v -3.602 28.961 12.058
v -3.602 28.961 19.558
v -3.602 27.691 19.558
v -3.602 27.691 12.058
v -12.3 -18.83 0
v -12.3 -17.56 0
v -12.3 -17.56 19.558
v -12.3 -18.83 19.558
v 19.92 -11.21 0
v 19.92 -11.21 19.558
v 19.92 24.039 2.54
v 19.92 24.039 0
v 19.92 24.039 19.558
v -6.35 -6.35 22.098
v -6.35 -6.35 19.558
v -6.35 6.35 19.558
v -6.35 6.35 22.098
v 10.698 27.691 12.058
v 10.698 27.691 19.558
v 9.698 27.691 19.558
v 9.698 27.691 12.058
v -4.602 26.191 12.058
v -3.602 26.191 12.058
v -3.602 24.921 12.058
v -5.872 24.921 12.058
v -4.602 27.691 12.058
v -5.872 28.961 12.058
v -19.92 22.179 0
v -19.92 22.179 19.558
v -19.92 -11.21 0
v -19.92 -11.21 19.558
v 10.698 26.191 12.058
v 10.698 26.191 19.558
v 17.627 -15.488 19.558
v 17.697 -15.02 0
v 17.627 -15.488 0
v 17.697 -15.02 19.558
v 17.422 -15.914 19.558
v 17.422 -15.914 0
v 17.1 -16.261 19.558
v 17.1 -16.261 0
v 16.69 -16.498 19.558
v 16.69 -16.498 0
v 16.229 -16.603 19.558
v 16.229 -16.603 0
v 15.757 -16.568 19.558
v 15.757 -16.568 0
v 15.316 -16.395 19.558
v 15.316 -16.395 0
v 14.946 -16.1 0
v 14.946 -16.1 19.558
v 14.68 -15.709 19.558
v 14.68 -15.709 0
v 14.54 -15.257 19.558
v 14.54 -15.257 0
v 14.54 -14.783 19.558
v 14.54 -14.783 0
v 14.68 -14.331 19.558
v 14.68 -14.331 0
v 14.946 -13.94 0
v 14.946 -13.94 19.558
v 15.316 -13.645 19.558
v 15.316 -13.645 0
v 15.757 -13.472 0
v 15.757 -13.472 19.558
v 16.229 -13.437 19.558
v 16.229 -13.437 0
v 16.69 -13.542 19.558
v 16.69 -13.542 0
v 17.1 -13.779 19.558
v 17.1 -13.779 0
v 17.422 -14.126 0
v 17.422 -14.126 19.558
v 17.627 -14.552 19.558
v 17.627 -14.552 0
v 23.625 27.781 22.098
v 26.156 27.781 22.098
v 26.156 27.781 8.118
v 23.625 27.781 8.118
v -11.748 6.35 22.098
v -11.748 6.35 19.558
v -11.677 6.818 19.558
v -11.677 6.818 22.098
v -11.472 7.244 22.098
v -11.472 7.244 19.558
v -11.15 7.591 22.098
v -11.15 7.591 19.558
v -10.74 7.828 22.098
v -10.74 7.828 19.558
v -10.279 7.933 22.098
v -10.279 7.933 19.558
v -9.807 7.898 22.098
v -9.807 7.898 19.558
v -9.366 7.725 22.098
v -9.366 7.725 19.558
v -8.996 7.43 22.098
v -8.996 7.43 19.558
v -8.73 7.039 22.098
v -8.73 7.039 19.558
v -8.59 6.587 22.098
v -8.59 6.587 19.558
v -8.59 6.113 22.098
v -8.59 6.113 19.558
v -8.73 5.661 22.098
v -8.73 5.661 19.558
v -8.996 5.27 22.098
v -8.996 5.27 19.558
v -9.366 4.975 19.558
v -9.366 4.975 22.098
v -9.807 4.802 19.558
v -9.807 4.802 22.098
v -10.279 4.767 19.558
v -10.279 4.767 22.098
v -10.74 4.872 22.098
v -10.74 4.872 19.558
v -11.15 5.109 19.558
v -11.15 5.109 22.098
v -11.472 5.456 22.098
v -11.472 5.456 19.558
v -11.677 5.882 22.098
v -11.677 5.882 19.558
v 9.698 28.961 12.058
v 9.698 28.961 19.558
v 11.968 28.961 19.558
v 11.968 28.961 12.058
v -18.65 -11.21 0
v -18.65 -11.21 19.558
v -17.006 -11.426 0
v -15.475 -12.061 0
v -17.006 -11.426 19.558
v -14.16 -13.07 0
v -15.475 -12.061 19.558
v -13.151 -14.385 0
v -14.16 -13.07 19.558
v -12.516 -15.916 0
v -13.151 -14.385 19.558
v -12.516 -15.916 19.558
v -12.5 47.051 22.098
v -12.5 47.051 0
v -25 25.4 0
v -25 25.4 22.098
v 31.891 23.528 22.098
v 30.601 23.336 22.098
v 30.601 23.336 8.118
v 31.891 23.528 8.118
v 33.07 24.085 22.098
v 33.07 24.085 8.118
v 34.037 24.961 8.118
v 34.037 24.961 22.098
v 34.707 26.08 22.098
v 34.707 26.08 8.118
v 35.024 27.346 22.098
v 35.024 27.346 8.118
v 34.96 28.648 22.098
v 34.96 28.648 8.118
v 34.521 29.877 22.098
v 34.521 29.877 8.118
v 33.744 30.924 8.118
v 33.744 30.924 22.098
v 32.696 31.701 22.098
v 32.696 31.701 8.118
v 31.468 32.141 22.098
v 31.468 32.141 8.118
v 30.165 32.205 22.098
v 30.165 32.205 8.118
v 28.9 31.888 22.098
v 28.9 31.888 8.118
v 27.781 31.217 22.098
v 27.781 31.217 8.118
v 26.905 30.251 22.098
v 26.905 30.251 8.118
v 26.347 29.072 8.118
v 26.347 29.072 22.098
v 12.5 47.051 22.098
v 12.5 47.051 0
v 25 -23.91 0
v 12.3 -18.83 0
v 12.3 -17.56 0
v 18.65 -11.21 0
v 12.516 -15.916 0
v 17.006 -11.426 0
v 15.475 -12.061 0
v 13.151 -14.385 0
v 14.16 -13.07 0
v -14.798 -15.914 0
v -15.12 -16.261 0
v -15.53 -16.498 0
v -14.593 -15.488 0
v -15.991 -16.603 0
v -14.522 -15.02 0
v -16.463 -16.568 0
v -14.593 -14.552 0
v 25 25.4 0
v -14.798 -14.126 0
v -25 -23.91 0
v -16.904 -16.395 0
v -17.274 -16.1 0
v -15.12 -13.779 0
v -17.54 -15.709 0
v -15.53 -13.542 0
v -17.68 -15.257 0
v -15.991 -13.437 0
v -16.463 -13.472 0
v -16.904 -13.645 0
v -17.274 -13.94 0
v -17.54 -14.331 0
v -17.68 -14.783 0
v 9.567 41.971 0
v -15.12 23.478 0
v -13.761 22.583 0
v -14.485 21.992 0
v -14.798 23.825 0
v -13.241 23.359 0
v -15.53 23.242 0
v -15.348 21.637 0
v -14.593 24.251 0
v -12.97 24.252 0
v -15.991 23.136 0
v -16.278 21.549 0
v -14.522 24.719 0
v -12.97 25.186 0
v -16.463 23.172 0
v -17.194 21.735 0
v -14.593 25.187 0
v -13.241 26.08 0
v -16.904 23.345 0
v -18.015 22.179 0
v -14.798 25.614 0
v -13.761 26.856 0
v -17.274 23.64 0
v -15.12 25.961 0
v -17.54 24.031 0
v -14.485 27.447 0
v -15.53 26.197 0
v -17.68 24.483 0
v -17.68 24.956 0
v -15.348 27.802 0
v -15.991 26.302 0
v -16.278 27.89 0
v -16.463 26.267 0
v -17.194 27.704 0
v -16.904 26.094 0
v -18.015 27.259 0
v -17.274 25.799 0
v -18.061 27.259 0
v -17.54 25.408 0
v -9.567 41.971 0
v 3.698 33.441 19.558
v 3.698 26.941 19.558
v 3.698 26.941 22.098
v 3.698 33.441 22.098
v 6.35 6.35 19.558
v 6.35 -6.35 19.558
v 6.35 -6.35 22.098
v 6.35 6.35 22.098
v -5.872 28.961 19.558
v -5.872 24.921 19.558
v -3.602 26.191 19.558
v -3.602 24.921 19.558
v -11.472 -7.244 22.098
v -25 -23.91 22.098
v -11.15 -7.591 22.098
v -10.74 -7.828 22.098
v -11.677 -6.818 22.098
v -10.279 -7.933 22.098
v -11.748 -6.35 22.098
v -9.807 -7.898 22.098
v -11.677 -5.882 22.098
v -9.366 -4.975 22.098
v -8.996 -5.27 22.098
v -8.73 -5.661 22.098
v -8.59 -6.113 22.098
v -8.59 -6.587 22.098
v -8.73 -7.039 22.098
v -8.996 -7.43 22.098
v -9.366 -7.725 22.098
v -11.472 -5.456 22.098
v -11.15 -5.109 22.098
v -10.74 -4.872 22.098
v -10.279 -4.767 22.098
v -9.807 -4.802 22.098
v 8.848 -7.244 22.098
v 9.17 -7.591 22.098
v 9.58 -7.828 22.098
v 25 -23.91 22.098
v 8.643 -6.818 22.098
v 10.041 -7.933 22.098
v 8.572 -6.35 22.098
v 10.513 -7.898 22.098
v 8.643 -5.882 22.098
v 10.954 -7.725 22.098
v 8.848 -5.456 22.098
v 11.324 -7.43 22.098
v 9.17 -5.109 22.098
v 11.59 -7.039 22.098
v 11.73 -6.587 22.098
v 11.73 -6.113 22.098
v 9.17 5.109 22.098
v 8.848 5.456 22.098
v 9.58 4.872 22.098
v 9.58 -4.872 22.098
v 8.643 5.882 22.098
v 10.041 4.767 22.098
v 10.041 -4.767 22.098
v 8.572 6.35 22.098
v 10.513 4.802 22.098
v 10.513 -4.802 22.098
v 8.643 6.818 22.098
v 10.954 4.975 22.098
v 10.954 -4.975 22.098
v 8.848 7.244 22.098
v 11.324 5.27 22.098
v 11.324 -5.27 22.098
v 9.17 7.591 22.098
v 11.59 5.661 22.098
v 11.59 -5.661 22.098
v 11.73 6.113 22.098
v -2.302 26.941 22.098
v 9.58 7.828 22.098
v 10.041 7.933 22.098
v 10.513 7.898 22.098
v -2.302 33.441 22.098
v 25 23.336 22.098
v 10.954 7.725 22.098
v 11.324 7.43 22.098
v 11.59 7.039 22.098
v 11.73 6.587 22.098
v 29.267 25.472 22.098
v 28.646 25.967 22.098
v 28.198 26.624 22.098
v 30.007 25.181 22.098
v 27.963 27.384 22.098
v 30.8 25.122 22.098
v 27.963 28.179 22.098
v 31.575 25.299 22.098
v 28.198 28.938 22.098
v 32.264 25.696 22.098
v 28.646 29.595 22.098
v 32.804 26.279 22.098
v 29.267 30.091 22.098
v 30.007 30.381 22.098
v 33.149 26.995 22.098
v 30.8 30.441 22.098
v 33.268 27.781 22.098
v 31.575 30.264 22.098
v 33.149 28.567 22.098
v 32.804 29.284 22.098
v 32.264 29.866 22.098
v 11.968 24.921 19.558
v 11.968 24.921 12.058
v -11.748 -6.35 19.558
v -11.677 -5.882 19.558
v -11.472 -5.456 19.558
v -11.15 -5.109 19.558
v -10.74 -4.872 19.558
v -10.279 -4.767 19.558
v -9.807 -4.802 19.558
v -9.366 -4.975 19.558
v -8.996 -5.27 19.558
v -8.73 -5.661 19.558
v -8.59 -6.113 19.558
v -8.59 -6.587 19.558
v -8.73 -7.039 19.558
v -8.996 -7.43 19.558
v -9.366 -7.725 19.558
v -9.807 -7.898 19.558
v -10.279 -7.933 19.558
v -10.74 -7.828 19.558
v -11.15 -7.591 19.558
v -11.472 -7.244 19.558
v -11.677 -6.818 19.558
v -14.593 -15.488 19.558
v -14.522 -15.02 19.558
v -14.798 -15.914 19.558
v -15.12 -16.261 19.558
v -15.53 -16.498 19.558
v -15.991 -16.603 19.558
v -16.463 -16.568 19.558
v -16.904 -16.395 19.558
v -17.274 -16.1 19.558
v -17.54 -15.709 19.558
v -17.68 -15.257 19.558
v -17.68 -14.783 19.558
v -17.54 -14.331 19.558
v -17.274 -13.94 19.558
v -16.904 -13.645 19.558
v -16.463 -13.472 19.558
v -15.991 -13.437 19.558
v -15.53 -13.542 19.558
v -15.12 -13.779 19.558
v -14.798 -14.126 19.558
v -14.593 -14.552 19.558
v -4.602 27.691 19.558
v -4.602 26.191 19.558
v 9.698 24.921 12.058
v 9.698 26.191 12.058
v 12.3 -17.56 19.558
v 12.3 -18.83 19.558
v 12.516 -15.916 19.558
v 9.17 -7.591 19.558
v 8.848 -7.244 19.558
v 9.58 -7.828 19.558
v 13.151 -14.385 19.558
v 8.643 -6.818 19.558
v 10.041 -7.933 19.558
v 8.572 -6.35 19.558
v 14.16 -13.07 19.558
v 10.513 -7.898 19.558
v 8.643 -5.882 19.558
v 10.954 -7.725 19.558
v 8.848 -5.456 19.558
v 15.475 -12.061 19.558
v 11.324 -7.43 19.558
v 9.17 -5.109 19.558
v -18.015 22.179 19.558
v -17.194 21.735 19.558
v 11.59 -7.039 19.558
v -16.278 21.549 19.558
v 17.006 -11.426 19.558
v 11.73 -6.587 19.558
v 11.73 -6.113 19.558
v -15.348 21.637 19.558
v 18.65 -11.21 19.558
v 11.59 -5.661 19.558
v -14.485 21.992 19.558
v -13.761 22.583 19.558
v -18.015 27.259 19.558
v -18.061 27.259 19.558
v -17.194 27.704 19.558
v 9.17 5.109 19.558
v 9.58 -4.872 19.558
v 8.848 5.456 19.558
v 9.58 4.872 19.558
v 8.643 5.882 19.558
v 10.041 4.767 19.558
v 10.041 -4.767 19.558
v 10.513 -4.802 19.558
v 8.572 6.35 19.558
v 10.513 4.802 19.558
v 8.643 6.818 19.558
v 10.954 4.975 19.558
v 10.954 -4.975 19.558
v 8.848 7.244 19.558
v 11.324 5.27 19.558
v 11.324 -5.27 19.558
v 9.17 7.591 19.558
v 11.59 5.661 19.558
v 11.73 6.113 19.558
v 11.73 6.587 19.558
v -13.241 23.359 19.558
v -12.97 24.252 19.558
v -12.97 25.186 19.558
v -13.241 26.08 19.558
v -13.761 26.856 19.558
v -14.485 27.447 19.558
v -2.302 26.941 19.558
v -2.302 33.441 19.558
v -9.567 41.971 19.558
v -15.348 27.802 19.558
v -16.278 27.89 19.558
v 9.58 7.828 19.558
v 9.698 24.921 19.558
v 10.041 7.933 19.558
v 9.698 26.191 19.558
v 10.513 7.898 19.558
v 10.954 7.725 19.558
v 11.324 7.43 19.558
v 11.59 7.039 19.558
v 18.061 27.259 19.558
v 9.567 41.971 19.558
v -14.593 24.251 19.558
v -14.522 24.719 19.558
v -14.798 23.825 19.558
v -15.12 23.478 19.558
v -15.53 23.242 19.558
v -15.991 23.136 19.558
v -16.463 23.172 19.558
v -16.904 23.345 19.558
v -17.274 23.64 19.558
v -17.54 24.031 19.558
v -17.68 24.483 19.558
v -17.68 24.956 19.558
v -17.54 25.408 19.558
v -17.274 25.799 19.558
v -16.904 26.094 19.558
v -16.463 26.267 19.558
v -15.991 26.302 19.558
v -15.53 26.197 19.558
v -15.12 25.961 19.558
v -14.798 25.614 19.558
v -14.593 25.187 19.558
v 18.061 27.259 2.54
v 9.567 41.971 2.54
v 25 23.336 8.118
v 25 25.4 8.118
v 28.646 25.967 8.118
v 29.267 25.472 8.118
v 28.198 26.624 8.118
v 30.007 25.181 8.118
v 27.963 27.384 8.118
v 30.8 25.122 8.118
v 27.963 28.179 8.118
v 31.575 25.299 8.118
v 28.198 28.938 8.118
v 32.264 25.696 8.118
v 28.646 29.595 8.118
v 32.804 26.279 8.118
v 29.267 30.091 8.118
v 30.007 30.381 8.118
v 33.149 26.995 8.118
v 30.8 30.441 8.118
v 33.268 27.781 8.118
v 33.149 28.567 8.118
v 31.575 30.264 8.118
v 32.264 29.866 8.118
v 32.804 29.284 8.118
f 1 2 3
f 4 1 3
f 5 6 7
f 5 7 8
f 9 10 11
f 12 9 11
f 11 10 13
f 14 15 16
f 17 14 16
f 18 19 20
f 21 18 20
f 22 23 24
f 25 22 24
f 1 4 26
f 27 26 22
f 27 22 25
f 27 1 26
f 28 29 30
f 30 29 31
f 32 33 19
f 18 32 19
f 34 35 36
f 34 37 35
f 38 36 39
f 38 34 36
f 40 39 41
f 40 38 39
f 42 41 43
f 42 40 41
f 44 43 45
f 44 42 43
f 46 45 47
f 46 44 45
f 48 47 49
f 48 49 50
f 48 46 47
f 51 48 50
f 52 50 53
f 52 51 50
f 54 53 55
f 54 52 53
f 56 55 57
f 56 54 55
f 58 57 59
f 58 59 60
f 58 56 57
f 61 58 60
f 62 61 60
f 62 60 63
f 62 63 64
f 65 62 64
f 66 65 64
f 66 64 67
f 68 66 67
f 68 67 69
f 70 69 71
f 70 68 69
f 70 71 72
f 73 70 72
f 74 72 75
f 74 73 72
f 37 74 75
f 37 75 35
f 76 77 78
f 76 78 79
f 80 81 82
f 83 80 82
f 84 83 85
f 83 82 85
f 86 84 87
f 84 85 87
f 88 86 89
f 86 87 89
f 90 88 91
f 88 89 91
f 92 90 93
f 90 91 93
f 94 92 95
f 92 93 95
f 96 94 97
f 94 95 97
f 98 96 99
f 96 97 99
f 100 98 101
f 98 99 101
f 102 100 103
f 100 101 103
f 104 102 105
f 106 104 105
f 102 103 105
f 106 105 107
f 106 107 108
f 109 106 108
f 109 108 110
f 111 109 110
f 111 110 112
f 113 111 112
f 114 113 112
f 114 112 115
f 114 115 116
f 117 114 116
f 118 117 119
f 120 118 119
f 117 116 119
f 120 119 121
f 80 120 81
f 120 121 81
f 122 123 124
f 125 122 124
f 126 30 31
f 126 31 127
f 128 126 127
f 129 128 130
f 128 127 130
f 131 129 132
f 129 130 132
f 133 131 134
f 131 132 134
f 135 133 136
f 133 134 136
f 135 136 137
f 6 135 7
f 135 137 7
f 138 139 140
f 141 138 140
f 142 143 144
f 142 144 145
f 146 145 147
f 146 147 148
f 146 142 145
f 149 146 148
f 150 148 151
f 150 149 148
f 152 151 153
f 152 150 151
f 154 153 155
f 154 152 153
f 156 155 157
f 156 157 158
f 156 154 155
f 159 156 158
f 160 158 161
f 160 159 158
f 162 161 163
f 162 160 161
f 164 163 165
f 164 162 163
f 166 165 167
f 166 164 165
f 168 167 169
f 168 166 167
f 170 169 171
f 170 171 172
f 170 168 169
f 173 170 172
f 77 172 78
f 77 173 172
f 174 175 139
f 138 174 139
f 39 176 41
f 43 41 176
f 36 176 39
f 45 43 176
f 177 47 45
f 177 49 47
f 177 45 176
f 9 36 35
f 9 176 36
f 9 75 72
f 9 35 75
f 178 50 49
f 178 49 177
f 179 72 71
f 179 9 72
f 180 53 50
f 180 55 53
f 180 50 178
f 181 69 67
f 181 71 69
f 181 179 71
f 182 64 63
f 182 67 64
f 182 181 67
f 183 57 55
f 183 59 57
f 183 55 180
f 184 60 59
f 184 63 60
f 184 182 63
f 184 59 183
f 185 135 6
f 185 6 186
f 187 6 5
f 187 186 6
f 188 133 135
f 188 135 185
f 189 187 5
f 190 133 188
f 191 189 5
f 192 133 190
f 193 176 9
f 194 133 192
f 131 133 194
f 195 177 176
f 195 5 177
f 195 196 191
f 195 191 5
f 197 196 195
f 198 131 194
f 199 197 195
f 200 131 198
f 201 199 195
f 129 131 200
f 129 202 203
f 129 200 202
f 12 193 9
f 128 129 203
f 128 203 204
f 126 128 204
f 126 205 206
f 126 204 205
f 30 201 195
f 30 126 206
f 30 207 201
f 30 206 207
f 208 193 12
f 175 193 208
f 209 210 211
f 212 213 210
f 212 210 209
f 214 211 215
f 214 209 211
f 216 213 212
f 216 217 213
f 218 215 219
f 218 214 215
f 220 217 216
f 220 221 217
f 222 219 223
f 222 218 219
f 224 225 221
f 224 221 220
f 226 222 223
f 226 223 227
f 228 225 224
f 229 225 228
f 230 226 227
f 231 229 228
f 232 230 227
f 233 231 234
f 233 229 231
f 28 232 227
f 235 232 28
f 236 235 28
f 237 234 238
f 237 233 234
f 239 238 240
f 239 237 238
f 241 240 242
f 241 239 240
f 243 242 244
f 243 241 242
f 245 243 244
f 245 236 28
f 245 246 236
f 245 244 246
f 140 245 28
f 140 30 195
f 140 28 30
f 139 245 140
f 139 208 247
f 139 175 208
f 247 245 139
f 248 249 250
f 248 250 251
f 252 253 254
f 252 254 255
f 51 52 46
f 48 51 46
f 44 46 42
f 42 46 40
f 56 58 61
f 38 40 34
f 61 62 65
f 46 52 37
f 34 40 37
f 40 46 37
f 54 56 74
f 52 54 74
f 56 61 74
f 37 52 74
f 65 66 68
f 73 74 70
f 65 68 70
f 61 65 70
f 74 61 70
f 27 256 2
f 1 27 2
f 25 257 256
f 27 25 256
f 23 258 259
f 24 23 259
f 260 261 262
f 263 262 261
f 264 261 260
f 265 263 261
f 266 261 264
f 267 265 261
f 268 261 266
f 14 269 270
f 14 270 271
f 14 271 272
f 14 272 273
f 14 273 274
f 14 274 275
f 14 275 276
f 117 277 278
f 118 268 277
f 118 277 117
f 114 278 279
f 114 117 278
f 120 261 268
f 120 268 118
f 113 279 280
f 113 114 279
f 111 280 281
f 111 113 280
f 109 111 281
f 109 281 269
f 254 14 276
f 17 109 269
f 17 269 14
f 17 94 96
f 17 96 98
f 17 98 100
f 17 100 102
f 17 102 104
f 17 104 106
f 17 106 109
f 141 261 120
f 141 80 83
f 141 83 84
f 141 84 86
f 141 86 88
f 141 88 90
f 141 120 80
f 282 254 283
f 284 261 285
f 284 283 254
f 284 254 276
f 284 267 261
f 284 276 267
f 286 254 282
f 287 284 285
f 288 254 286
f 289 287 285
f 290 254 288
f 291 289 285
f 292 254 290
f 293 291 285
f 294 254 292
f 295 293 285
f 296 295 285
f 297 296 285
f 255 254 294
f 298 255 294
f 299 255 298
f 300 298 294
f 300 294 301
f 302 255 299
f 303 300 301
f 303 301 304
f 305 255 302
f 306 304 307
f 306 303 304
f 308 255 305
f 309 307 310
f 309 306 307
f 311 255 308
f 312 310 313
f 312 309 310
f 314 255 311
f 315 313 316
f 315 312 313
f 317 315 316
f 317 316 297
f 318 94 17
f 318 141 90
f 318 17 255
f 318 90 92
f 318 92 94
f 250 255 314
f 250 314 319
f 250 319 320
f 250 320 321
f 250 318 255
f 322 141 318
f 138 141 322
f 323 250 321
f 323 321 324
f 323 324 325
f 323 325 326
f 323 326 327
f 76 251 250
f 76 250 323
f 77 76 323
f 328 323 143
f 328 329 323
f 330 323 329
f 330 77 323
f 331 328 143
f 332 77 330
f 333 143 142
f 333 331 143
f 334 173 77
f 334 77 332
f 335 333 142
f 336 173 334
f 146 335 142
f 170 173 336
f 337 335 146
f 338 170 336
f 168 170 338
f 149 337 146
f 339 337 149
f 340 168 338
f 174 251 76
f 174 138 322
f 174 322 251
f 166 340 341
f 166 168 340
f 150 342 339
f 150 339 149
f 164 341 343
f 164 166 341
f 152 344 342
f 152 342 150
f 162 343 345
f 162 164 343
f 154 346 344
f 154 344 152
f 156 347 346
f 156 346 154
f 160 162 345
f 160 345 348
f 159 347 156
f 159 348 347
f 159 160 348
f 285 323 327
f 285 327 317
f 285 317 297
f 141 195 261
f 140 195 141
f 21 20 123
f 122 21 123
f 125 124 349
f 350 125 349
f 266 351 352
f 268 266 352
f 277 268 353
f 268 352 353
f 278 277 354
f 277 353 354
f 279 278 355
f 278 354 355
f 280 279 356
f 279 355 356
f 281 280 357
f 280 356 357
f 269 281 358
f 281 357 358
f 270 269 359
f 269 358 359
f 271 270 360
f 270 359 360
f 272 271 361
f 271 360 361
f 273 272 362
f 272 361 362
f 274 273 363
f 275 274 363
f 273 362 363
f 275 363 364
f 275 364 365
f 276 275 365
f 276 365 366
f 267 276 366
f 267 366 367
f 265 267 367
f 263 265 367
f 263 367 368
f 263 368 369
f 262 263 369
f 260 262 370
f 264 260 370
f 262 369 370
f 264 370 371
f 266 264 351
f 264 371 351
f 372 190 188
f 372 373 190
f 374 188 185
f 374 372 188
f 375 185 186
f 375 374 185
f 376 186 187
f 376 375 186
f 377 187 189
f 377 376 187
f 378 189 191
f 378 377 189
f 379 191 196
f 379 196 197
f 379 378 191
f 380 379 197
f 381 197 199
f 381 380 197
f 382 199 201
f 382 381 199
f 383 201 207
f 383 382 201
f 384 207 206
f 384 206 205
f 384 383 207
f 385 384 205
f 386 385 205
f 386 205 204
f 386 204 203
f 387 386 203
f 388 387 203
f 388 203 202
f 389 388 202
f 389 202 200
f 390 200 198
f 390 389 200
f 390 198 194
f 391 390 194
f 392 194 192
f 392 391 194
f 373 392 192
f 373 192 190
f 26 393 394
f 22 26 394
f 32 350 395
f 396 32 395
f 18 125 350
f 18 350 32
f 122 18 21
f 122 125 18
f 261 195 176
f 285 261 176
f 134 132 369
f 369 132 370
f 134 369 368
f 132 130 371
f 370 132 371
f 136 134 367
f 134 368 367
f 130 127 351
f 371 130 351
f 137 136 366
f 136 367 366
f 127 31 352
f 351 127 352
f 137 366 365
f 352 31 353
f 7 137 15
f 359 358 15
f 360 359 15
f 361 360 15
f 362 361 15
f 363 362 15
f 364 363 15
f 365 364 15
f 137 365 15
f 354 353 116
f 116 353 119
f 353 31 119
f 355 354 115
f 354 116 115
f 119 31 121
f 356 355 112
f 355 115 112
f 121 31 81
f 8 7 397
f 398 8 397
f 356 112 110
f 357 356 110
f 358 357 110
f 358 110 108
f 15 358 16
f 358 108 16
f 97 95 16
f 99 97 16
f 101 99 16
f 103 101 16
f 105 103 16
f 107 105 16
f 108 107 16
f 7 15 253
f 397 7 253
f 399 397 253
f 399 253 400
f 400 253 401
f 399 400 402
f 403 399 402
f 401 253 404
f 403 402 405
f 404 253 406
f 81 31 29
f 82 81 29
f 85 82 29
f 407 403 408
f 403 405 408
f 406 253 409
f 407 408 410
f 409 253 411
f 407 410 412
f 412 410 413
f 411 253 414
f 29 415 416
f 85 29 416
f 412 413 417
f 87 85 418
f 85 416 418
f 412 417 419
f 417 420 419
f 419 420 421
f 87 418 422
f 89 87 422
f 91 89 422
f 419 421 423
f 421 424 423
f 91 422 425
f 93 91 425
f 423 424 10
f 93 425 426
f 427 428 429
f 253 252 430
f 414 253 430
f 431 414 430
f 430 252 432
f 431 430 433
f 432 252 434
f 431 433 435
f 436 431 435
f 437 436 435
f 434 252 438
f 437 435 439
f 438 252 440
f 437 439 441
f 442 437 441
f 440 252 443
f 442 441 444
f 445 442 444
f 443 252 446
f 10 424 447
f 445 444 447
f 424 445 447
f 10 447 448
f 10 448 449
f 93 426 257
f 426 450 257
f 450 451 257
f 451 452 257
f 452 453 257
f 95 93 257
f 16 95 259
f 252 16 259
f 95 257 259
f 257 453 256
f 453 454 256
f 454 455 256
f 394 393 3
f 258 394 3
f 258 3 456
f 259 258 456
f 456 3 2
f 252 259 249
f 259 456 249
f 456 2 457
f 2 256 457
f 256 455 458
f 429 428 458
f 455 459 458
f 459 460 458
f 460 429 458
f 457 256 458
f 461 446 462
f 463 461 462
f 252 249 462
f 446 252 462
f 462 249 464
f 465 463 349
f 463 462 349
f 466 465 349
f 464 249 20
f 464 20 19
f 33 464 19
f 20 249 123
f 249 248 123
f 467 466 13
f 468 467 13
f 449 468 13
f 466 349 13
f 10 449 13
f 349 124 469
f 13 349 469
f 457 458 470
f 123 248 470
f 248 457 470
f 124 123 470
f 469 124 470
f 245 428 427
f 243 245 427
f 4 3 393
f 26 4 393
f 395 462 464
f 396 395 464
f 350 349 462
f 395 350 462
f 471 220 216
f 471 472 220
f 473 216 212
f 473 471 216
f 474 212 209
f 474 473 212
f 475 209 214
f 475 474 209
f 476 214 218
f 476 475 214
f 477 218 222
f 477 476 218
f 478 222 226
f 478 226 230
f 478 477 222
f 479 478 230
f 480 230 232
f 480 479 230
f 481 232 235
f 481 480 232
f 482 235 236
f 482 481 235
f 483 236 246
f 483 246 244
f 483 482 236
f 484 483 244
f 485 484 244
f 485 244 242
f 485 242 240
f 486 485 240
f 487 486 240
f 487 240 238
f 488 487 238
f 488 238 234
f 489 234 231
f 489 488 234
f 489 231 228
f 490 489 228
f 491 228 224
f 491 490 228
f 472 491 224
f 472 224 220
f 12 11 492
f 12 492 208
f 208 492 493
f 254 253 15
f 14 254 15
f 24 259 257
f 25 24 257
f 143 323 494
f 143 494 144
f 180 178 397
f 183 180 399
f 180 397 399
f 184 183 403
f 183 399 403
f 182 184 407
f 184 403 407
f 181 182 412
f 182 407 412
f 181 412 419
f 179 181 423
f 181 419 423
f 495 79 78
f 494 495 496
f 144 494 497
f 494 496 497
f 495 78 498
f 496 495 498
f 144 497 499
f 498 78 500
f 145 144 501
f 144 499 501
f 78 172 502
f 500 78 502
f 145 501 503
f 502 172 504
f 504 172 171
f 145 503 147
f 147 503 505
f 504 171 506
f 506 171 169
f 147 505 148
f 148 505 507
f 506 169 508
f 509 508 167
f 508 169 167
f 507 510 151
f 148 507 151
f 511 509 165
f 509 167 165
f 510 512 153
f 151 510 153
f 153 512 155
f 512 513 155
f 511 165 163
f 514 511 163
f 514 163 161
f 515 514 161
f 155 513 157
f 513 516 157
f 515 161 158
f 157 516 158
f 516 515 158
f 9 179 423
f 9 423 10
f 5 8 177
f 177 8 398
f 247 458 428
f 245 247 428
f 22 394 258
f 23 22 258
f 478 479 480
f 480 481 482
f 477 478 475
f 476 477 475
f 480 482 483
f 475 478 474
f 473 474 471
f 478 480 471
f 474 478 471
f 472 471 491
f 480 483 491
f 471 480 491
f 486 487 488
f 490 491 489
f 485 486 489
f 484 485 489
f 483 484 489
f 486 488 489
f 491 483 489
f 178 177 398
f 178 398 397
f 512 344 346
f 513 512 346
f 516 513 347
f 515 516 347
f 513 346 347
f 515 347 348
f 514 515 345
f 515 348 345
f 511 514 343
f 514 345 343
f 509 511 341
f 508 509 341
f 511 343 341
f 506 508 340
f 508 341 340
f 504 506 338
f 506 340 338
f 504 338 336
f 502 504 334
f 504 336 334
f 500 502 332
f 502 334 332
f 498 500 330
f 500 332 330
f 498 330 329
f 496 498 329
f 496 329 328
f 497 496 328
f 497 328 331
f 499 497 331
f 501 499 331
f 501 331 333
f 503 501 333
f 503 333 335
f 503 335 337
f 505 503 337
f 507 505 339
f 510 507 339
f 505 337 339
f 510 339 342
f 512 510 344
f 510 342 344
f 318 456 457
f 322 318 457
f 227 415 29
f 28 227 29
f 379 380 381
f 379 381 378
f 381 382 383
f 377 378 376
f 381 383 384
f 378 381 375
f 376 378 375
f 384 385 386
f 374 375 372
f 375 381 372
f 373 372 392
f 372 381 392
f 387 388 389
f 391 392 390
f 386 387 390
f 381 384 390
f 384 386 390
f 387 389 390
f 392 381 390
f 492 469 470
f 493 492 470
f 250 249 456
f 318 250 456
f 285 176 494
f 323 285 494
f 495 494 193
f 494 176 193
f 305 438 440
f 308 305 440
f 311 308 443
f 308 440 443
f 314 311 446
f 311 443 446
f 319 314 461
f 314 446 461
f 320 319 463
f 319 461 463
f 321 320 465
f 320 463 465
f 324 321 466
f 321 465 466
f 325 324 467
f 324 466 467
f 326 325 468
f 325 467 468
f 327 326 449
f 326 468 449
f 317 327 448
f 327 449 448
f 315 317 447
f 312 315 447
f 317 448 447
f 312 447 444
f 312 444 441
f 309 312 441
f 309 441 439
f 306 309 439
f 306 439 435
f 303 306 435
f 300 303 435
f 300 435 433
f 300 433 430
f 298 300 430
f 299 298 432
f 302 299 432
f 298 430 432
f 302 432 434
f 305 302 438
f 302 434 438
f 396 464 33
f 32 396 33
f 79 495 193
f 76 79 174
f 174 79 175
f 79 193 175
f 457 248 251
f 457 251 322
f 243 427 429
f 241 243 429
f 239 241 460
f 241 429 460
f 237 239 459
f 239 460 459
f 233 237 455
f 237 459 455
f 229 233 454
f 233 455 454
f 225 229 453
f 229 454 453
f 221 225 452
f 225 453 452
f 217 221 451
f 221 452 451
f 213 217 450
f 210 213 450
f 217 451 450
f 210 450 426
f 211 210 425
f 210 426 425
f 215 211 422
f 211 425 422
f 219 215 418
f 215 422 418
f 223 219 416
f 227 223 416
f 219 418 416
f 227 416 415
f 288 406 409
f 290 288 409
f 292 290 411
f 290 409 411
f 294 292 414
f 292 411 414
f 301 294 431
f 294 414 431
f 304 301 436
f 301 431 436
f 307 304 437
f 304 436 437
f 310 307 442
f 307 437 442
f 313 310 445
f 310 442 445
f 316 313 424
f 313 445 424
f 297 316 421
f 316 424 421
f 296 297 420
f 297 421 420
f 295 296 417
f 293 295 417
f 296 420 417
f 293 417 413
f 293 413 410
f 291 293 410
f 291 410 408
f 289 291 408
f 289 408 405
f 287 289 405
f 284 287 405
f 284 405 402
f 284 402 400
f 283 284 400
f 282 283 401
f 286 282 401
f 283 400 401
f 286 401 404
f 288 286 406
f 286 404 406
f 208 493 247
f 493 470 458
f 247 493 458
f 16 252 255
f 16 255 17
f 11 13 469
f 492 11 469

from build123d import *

# Parameters (mm, degrees)
SKETCH1_W           = 50
SKETCH1_H           = 49.309999932
BOSS_EXTRUDE1_DEPTH = 22.098
SKETCH11_R          = 1.5875
CUT_EXTRUDE7_DEPTH  = 33.02
CUT_EXTRUDE8_DEPTH  = 2.54
BOSS_EXTRUDE5_DEPTH = 2.54
BOSS_EXTRUDE6_DEPTH = 7.5
SKETCH14_R          = 1.5875
SKETCH14_W          = 12.7
SKETCH14_H          = 12.7
CUT_EXTRUDE9_DEPTH  = 2.54
SKETCH20_W          = 6
SKETCH20_H          = 6.5
CUT_EXTRUDE13_DEPTH = 7.5
SKETCH22_R          = 2.667
BOSS_EXTRUDE7_DEPTH = 13.97999998
SKETCH24_R          = 1.5875
BOSS_EXTRUDE9_DEPTH = 2.54


with BuildPart() as part:
    # Sketch1 → Boss-Extrude1 (new body)
    with BuildSketch(Plane.XY):
        with Locations((0, 0.745000034)):
            Rectangle(SKETCH1_W, SKETCH1_H)
        Polygon((12.5, 47.050635095), (-12.5, 47.050635095), (-25, 25.4), (25, 25.4), align=None)
    extrude(amount=BOSS_EXTRUDE1_DEPTH)

    # Sketch11 → Cut-Extrude7 (cut)
    with BuildSketch(Plane.XY.offset(22.098)):
        with BuildLine():
            Line((-18.015, 22.179409051), (-19.92, 22.179409051))
            Line((-19.92, 22.179409051), (-19.92, -11.209999932))
            Line((-19.92, -11.209999932), (-18.65, -11.209999932))
            ThreePointArc((-18.65, -11.209999932), (-14.159871939, -13.069871871), (-12.3, -17.559999932))
            Line((-12.3, -17.559999932), (-12.3, -18.829999932))
            Line((-12.3, -18.829999932), (12.3, -18.829999932))
            Line((12.3, -18.829999932), (12.3, -17.559999932))
            ThreePointArc((12.3, -17.559999932), (14.159871939, -13.069871871), (18.65, -11.209999932))
            Line((18.65, -11.209999932), (19.92, -11.209999932))
            Line((19.92, -11.209999932), (19.92, 24.038818102))
            Line((19.92, 24.038818102), (18.060590949, 27.259409051))
            Line((18.060590949, 27.259409051), (9.567060633, 41.970635095))
            Line((9.567060633, 41.970635095), (-9.567060633, 41.970635095))
            Line((-9.567060633, 41.970635095), (-18.060590949, 27.259409051))
            Line((-18.060590949, 27.259409051), (-18.015, 27.259409051))
            ThreePointArc((-18.015, 27.259409051), (-12.935, 24.719409051), (-18.015, 22.179409051))
        make_face()
        with Locations((-16.11, 24.719409051)):
            Circle(SKETCH11_R)
        with Locations((16.11, -15.02)):
            Circle(SKETCH11_R)
        with Locations((-16.11, -15.02)):
            Circle(SKETCH11_R)
    extrude(amount=-CUT_EXTRUDE7_DEPTH, mode=Mode.SUBTRACT)

    # Sketch12 → Cut-Extrude8 (cut)
    with BuildSketch(Plane(origin=(0, 0, 0), x_dir=(-1, 0, 0), z_dir=(0, 0, -1))):
        Polygon((-22.46, 25.4), (-22.46, -21.369999932), (22.46, -21.369999932), (22.46, 25.4), (11.23, 44.850930569), (-11.23, 44.850930569), align=None)
    extrude(amount=-CUT_EXTRUDE8_DEPTH, mode=Mode.SUBTRACT)

    # Sketch13 → Boss-Extrude5 (add)
    with BuildSketch(Plane.XY.offset(22.098)):
        Polygon((-25, 25.4), (-25, -23.909999932), (25, -23.909999932), (25, 25.4), (12.5, 47.050635095), (-12.5, 47.050635095), align=None)
    extrude(amount=-BOSS_EXTRUDE5_DEPTH)

    # Sketch19 → Boss-Extrude6 (add)
    with BuildSketch(Plane(origin=(0, 0, 19.558), x_dir=(-1, 0, 0), z_dir=(0, 0, -1))):
        Polygon((-11.968279908, 28.961226002), (-11.968279908, 24.921226002), (-9.698279908, 24.921226002), (-9.698279908, 26.191226002), (-10.698279908, 26.191226002), (-10.698279908, 27.691226002), (-9.698279908, 27.691226002), (-9.698279908, 28.961226002), align=None)
        Polygon((4.601720092, 27.691226002), (4.601720092, 26.191226002), (3.601720092, 26.191226002), (3.601720092, 24.921226002), (5.871720092, 24.921226002), (5.871720092, 28.961226002), (3.601720092, 28.961226002), (3.601720092, 27.691226002), align=None)
    extrude(amount=BOSS_EXTRUDE6_DEPTH)

    # Sketch14 → Cut-Extrude9 (cut)
    with BuildSketch(Plane(origin=(0, 0, 19.558), x_dir=(-1, 0, 0), z_dir=(0, 0, -1))):
        with Locations((-10.16, 6.35)):
            Circle(SKETCH14_R)
        with Locations((10.16, 6.35)):
            Circle(SKETCH14_R)
        with Locations((10.16, -6.35)):
            Circle(SKETCH14_R)
        with Locations((-10.16, -6.35)):
            Circle(SKETCH14_R)
        Rectangle(SKETCH14_W, SKETCH14_H)
    extrude(amount=-CUT_EXTRUDE9_DEPTH, mode=Mode.SUBTRACT)

    # Sketch20 → Cut-Extrude13 (cut)
    with BuildSketch(Plane(origin=(0, 0, 19.558), x_dir=(-1, 0, 0), z_dir=(0, 0, -1))):
        with Locations((-0.698279908, 30.191226002)):
            Rectangle(SKETCH20_W, SKETCH20_H)
    extrude(amount=-CUT_EXTRUDE13_DEPTH, mode=Mode.SUBTRACT)

    # Sketch22 → Boss-Extrude7 (add)
    with BuildSketch(Plane.XY.offset(22.098)):
        with BuildLine():
            Line((26.155685571, 27.78125), (23.625184671, 27.78125))
            Line((23.625184671, 27.78125), (25, 25.4))
            Line((25, 25.4), (25, 23.33625))
            Line((25, 23.33625), (30.600685571, 23.33625))
            ThreePointArc((30.600685571, 23.33625), (33.743775214, 30.924339642), (26.155685571, 27.78125))
        make_face()
        with Locations((30.600685571, 27.78125)):
            Circle(SKETCH22_R, mode=Mode.SUBTRACT)
    extrude(amount=-BOSS_EXTRUDE7_DEPTH)

    # Sketch24 → Boss-Extrude9 (add)
    with BuildSketch(Plane(origin=(0, 0, 2.54), x_dir=(-1, 0, 0), z_dir=(0, 0, -1))):
        Polygon((11.23, 44.850930569), (-11.23, 44.850930569), (-22.46, 25.4), (-22.46, -21.369999932), (22.46, -21.369999932), (22.46, 25.4), align=None)
        with Locations(Location((16.11, -15.02, 0), (0, 0, 180))):
            Circle(SKETCH24_R, mode=Mode.SUBTRACT)
        with Locations(Location((16.11, 24.719409051, 0), (0, 0, 180))):
            Circle(SKETCH24_R, mode=Mode.SUBTRACT)
        with Locations(Location((-16.11, -15.02, 0), (0, 0, 180))):
            Circle(SKETCH24_R, mode=Mode.SUBTRACT)
        with BuildLine():
            Line((-19.92, 24.038818102), (-9.567060633, 41.970635095))
            Line((-9.567060633, 41.970635095), (9.567060633, 41.970635095))
            Line((9.567060633, 41.970635095), (18.060590949, 27.259409051))
            Line((18.060590949, 27.259409051), (18.015, 27.259409051))
            ThreePointArc((18.015, 27.259409051), (12.935, 24.719409051), (18.015, 22.179409051))
            Line((18.015, 22.179409051), (19.92, 22.179409051))
            Line((19.92, 22.179409051), (19.92, -11.209999932))
            Line((19.92, -11.209999932), (18.65, -11.209999932))
            ThreePointArc((18.65, -11.209999932), (14.159871939, -13.069871871), (12.3, -17.559999932))
            Line((12.3, -17.559999932), (12.3, -18.829999932))
            Line((12.3, -18.829999932), (-12.3, -18.829999932))
            Line((-12.3, -18.829999932), (-12.3, -17.559999932))
            ThreePointArc((-12.3, -17.559999932), (-14.159871939, -13.069871871), (-18.65, -11.209999932))
            Line((-18.65, -11.209999932), (-19.92, -11.209999932))
            Line((-19.92, -11.209999932), (-19.92, 24.038818102))
        make_face(mode=Mode.SUBTRACT)
    extrude(amount=BOSS_EXTRUDE9_DEPTH)


solid = part.part
